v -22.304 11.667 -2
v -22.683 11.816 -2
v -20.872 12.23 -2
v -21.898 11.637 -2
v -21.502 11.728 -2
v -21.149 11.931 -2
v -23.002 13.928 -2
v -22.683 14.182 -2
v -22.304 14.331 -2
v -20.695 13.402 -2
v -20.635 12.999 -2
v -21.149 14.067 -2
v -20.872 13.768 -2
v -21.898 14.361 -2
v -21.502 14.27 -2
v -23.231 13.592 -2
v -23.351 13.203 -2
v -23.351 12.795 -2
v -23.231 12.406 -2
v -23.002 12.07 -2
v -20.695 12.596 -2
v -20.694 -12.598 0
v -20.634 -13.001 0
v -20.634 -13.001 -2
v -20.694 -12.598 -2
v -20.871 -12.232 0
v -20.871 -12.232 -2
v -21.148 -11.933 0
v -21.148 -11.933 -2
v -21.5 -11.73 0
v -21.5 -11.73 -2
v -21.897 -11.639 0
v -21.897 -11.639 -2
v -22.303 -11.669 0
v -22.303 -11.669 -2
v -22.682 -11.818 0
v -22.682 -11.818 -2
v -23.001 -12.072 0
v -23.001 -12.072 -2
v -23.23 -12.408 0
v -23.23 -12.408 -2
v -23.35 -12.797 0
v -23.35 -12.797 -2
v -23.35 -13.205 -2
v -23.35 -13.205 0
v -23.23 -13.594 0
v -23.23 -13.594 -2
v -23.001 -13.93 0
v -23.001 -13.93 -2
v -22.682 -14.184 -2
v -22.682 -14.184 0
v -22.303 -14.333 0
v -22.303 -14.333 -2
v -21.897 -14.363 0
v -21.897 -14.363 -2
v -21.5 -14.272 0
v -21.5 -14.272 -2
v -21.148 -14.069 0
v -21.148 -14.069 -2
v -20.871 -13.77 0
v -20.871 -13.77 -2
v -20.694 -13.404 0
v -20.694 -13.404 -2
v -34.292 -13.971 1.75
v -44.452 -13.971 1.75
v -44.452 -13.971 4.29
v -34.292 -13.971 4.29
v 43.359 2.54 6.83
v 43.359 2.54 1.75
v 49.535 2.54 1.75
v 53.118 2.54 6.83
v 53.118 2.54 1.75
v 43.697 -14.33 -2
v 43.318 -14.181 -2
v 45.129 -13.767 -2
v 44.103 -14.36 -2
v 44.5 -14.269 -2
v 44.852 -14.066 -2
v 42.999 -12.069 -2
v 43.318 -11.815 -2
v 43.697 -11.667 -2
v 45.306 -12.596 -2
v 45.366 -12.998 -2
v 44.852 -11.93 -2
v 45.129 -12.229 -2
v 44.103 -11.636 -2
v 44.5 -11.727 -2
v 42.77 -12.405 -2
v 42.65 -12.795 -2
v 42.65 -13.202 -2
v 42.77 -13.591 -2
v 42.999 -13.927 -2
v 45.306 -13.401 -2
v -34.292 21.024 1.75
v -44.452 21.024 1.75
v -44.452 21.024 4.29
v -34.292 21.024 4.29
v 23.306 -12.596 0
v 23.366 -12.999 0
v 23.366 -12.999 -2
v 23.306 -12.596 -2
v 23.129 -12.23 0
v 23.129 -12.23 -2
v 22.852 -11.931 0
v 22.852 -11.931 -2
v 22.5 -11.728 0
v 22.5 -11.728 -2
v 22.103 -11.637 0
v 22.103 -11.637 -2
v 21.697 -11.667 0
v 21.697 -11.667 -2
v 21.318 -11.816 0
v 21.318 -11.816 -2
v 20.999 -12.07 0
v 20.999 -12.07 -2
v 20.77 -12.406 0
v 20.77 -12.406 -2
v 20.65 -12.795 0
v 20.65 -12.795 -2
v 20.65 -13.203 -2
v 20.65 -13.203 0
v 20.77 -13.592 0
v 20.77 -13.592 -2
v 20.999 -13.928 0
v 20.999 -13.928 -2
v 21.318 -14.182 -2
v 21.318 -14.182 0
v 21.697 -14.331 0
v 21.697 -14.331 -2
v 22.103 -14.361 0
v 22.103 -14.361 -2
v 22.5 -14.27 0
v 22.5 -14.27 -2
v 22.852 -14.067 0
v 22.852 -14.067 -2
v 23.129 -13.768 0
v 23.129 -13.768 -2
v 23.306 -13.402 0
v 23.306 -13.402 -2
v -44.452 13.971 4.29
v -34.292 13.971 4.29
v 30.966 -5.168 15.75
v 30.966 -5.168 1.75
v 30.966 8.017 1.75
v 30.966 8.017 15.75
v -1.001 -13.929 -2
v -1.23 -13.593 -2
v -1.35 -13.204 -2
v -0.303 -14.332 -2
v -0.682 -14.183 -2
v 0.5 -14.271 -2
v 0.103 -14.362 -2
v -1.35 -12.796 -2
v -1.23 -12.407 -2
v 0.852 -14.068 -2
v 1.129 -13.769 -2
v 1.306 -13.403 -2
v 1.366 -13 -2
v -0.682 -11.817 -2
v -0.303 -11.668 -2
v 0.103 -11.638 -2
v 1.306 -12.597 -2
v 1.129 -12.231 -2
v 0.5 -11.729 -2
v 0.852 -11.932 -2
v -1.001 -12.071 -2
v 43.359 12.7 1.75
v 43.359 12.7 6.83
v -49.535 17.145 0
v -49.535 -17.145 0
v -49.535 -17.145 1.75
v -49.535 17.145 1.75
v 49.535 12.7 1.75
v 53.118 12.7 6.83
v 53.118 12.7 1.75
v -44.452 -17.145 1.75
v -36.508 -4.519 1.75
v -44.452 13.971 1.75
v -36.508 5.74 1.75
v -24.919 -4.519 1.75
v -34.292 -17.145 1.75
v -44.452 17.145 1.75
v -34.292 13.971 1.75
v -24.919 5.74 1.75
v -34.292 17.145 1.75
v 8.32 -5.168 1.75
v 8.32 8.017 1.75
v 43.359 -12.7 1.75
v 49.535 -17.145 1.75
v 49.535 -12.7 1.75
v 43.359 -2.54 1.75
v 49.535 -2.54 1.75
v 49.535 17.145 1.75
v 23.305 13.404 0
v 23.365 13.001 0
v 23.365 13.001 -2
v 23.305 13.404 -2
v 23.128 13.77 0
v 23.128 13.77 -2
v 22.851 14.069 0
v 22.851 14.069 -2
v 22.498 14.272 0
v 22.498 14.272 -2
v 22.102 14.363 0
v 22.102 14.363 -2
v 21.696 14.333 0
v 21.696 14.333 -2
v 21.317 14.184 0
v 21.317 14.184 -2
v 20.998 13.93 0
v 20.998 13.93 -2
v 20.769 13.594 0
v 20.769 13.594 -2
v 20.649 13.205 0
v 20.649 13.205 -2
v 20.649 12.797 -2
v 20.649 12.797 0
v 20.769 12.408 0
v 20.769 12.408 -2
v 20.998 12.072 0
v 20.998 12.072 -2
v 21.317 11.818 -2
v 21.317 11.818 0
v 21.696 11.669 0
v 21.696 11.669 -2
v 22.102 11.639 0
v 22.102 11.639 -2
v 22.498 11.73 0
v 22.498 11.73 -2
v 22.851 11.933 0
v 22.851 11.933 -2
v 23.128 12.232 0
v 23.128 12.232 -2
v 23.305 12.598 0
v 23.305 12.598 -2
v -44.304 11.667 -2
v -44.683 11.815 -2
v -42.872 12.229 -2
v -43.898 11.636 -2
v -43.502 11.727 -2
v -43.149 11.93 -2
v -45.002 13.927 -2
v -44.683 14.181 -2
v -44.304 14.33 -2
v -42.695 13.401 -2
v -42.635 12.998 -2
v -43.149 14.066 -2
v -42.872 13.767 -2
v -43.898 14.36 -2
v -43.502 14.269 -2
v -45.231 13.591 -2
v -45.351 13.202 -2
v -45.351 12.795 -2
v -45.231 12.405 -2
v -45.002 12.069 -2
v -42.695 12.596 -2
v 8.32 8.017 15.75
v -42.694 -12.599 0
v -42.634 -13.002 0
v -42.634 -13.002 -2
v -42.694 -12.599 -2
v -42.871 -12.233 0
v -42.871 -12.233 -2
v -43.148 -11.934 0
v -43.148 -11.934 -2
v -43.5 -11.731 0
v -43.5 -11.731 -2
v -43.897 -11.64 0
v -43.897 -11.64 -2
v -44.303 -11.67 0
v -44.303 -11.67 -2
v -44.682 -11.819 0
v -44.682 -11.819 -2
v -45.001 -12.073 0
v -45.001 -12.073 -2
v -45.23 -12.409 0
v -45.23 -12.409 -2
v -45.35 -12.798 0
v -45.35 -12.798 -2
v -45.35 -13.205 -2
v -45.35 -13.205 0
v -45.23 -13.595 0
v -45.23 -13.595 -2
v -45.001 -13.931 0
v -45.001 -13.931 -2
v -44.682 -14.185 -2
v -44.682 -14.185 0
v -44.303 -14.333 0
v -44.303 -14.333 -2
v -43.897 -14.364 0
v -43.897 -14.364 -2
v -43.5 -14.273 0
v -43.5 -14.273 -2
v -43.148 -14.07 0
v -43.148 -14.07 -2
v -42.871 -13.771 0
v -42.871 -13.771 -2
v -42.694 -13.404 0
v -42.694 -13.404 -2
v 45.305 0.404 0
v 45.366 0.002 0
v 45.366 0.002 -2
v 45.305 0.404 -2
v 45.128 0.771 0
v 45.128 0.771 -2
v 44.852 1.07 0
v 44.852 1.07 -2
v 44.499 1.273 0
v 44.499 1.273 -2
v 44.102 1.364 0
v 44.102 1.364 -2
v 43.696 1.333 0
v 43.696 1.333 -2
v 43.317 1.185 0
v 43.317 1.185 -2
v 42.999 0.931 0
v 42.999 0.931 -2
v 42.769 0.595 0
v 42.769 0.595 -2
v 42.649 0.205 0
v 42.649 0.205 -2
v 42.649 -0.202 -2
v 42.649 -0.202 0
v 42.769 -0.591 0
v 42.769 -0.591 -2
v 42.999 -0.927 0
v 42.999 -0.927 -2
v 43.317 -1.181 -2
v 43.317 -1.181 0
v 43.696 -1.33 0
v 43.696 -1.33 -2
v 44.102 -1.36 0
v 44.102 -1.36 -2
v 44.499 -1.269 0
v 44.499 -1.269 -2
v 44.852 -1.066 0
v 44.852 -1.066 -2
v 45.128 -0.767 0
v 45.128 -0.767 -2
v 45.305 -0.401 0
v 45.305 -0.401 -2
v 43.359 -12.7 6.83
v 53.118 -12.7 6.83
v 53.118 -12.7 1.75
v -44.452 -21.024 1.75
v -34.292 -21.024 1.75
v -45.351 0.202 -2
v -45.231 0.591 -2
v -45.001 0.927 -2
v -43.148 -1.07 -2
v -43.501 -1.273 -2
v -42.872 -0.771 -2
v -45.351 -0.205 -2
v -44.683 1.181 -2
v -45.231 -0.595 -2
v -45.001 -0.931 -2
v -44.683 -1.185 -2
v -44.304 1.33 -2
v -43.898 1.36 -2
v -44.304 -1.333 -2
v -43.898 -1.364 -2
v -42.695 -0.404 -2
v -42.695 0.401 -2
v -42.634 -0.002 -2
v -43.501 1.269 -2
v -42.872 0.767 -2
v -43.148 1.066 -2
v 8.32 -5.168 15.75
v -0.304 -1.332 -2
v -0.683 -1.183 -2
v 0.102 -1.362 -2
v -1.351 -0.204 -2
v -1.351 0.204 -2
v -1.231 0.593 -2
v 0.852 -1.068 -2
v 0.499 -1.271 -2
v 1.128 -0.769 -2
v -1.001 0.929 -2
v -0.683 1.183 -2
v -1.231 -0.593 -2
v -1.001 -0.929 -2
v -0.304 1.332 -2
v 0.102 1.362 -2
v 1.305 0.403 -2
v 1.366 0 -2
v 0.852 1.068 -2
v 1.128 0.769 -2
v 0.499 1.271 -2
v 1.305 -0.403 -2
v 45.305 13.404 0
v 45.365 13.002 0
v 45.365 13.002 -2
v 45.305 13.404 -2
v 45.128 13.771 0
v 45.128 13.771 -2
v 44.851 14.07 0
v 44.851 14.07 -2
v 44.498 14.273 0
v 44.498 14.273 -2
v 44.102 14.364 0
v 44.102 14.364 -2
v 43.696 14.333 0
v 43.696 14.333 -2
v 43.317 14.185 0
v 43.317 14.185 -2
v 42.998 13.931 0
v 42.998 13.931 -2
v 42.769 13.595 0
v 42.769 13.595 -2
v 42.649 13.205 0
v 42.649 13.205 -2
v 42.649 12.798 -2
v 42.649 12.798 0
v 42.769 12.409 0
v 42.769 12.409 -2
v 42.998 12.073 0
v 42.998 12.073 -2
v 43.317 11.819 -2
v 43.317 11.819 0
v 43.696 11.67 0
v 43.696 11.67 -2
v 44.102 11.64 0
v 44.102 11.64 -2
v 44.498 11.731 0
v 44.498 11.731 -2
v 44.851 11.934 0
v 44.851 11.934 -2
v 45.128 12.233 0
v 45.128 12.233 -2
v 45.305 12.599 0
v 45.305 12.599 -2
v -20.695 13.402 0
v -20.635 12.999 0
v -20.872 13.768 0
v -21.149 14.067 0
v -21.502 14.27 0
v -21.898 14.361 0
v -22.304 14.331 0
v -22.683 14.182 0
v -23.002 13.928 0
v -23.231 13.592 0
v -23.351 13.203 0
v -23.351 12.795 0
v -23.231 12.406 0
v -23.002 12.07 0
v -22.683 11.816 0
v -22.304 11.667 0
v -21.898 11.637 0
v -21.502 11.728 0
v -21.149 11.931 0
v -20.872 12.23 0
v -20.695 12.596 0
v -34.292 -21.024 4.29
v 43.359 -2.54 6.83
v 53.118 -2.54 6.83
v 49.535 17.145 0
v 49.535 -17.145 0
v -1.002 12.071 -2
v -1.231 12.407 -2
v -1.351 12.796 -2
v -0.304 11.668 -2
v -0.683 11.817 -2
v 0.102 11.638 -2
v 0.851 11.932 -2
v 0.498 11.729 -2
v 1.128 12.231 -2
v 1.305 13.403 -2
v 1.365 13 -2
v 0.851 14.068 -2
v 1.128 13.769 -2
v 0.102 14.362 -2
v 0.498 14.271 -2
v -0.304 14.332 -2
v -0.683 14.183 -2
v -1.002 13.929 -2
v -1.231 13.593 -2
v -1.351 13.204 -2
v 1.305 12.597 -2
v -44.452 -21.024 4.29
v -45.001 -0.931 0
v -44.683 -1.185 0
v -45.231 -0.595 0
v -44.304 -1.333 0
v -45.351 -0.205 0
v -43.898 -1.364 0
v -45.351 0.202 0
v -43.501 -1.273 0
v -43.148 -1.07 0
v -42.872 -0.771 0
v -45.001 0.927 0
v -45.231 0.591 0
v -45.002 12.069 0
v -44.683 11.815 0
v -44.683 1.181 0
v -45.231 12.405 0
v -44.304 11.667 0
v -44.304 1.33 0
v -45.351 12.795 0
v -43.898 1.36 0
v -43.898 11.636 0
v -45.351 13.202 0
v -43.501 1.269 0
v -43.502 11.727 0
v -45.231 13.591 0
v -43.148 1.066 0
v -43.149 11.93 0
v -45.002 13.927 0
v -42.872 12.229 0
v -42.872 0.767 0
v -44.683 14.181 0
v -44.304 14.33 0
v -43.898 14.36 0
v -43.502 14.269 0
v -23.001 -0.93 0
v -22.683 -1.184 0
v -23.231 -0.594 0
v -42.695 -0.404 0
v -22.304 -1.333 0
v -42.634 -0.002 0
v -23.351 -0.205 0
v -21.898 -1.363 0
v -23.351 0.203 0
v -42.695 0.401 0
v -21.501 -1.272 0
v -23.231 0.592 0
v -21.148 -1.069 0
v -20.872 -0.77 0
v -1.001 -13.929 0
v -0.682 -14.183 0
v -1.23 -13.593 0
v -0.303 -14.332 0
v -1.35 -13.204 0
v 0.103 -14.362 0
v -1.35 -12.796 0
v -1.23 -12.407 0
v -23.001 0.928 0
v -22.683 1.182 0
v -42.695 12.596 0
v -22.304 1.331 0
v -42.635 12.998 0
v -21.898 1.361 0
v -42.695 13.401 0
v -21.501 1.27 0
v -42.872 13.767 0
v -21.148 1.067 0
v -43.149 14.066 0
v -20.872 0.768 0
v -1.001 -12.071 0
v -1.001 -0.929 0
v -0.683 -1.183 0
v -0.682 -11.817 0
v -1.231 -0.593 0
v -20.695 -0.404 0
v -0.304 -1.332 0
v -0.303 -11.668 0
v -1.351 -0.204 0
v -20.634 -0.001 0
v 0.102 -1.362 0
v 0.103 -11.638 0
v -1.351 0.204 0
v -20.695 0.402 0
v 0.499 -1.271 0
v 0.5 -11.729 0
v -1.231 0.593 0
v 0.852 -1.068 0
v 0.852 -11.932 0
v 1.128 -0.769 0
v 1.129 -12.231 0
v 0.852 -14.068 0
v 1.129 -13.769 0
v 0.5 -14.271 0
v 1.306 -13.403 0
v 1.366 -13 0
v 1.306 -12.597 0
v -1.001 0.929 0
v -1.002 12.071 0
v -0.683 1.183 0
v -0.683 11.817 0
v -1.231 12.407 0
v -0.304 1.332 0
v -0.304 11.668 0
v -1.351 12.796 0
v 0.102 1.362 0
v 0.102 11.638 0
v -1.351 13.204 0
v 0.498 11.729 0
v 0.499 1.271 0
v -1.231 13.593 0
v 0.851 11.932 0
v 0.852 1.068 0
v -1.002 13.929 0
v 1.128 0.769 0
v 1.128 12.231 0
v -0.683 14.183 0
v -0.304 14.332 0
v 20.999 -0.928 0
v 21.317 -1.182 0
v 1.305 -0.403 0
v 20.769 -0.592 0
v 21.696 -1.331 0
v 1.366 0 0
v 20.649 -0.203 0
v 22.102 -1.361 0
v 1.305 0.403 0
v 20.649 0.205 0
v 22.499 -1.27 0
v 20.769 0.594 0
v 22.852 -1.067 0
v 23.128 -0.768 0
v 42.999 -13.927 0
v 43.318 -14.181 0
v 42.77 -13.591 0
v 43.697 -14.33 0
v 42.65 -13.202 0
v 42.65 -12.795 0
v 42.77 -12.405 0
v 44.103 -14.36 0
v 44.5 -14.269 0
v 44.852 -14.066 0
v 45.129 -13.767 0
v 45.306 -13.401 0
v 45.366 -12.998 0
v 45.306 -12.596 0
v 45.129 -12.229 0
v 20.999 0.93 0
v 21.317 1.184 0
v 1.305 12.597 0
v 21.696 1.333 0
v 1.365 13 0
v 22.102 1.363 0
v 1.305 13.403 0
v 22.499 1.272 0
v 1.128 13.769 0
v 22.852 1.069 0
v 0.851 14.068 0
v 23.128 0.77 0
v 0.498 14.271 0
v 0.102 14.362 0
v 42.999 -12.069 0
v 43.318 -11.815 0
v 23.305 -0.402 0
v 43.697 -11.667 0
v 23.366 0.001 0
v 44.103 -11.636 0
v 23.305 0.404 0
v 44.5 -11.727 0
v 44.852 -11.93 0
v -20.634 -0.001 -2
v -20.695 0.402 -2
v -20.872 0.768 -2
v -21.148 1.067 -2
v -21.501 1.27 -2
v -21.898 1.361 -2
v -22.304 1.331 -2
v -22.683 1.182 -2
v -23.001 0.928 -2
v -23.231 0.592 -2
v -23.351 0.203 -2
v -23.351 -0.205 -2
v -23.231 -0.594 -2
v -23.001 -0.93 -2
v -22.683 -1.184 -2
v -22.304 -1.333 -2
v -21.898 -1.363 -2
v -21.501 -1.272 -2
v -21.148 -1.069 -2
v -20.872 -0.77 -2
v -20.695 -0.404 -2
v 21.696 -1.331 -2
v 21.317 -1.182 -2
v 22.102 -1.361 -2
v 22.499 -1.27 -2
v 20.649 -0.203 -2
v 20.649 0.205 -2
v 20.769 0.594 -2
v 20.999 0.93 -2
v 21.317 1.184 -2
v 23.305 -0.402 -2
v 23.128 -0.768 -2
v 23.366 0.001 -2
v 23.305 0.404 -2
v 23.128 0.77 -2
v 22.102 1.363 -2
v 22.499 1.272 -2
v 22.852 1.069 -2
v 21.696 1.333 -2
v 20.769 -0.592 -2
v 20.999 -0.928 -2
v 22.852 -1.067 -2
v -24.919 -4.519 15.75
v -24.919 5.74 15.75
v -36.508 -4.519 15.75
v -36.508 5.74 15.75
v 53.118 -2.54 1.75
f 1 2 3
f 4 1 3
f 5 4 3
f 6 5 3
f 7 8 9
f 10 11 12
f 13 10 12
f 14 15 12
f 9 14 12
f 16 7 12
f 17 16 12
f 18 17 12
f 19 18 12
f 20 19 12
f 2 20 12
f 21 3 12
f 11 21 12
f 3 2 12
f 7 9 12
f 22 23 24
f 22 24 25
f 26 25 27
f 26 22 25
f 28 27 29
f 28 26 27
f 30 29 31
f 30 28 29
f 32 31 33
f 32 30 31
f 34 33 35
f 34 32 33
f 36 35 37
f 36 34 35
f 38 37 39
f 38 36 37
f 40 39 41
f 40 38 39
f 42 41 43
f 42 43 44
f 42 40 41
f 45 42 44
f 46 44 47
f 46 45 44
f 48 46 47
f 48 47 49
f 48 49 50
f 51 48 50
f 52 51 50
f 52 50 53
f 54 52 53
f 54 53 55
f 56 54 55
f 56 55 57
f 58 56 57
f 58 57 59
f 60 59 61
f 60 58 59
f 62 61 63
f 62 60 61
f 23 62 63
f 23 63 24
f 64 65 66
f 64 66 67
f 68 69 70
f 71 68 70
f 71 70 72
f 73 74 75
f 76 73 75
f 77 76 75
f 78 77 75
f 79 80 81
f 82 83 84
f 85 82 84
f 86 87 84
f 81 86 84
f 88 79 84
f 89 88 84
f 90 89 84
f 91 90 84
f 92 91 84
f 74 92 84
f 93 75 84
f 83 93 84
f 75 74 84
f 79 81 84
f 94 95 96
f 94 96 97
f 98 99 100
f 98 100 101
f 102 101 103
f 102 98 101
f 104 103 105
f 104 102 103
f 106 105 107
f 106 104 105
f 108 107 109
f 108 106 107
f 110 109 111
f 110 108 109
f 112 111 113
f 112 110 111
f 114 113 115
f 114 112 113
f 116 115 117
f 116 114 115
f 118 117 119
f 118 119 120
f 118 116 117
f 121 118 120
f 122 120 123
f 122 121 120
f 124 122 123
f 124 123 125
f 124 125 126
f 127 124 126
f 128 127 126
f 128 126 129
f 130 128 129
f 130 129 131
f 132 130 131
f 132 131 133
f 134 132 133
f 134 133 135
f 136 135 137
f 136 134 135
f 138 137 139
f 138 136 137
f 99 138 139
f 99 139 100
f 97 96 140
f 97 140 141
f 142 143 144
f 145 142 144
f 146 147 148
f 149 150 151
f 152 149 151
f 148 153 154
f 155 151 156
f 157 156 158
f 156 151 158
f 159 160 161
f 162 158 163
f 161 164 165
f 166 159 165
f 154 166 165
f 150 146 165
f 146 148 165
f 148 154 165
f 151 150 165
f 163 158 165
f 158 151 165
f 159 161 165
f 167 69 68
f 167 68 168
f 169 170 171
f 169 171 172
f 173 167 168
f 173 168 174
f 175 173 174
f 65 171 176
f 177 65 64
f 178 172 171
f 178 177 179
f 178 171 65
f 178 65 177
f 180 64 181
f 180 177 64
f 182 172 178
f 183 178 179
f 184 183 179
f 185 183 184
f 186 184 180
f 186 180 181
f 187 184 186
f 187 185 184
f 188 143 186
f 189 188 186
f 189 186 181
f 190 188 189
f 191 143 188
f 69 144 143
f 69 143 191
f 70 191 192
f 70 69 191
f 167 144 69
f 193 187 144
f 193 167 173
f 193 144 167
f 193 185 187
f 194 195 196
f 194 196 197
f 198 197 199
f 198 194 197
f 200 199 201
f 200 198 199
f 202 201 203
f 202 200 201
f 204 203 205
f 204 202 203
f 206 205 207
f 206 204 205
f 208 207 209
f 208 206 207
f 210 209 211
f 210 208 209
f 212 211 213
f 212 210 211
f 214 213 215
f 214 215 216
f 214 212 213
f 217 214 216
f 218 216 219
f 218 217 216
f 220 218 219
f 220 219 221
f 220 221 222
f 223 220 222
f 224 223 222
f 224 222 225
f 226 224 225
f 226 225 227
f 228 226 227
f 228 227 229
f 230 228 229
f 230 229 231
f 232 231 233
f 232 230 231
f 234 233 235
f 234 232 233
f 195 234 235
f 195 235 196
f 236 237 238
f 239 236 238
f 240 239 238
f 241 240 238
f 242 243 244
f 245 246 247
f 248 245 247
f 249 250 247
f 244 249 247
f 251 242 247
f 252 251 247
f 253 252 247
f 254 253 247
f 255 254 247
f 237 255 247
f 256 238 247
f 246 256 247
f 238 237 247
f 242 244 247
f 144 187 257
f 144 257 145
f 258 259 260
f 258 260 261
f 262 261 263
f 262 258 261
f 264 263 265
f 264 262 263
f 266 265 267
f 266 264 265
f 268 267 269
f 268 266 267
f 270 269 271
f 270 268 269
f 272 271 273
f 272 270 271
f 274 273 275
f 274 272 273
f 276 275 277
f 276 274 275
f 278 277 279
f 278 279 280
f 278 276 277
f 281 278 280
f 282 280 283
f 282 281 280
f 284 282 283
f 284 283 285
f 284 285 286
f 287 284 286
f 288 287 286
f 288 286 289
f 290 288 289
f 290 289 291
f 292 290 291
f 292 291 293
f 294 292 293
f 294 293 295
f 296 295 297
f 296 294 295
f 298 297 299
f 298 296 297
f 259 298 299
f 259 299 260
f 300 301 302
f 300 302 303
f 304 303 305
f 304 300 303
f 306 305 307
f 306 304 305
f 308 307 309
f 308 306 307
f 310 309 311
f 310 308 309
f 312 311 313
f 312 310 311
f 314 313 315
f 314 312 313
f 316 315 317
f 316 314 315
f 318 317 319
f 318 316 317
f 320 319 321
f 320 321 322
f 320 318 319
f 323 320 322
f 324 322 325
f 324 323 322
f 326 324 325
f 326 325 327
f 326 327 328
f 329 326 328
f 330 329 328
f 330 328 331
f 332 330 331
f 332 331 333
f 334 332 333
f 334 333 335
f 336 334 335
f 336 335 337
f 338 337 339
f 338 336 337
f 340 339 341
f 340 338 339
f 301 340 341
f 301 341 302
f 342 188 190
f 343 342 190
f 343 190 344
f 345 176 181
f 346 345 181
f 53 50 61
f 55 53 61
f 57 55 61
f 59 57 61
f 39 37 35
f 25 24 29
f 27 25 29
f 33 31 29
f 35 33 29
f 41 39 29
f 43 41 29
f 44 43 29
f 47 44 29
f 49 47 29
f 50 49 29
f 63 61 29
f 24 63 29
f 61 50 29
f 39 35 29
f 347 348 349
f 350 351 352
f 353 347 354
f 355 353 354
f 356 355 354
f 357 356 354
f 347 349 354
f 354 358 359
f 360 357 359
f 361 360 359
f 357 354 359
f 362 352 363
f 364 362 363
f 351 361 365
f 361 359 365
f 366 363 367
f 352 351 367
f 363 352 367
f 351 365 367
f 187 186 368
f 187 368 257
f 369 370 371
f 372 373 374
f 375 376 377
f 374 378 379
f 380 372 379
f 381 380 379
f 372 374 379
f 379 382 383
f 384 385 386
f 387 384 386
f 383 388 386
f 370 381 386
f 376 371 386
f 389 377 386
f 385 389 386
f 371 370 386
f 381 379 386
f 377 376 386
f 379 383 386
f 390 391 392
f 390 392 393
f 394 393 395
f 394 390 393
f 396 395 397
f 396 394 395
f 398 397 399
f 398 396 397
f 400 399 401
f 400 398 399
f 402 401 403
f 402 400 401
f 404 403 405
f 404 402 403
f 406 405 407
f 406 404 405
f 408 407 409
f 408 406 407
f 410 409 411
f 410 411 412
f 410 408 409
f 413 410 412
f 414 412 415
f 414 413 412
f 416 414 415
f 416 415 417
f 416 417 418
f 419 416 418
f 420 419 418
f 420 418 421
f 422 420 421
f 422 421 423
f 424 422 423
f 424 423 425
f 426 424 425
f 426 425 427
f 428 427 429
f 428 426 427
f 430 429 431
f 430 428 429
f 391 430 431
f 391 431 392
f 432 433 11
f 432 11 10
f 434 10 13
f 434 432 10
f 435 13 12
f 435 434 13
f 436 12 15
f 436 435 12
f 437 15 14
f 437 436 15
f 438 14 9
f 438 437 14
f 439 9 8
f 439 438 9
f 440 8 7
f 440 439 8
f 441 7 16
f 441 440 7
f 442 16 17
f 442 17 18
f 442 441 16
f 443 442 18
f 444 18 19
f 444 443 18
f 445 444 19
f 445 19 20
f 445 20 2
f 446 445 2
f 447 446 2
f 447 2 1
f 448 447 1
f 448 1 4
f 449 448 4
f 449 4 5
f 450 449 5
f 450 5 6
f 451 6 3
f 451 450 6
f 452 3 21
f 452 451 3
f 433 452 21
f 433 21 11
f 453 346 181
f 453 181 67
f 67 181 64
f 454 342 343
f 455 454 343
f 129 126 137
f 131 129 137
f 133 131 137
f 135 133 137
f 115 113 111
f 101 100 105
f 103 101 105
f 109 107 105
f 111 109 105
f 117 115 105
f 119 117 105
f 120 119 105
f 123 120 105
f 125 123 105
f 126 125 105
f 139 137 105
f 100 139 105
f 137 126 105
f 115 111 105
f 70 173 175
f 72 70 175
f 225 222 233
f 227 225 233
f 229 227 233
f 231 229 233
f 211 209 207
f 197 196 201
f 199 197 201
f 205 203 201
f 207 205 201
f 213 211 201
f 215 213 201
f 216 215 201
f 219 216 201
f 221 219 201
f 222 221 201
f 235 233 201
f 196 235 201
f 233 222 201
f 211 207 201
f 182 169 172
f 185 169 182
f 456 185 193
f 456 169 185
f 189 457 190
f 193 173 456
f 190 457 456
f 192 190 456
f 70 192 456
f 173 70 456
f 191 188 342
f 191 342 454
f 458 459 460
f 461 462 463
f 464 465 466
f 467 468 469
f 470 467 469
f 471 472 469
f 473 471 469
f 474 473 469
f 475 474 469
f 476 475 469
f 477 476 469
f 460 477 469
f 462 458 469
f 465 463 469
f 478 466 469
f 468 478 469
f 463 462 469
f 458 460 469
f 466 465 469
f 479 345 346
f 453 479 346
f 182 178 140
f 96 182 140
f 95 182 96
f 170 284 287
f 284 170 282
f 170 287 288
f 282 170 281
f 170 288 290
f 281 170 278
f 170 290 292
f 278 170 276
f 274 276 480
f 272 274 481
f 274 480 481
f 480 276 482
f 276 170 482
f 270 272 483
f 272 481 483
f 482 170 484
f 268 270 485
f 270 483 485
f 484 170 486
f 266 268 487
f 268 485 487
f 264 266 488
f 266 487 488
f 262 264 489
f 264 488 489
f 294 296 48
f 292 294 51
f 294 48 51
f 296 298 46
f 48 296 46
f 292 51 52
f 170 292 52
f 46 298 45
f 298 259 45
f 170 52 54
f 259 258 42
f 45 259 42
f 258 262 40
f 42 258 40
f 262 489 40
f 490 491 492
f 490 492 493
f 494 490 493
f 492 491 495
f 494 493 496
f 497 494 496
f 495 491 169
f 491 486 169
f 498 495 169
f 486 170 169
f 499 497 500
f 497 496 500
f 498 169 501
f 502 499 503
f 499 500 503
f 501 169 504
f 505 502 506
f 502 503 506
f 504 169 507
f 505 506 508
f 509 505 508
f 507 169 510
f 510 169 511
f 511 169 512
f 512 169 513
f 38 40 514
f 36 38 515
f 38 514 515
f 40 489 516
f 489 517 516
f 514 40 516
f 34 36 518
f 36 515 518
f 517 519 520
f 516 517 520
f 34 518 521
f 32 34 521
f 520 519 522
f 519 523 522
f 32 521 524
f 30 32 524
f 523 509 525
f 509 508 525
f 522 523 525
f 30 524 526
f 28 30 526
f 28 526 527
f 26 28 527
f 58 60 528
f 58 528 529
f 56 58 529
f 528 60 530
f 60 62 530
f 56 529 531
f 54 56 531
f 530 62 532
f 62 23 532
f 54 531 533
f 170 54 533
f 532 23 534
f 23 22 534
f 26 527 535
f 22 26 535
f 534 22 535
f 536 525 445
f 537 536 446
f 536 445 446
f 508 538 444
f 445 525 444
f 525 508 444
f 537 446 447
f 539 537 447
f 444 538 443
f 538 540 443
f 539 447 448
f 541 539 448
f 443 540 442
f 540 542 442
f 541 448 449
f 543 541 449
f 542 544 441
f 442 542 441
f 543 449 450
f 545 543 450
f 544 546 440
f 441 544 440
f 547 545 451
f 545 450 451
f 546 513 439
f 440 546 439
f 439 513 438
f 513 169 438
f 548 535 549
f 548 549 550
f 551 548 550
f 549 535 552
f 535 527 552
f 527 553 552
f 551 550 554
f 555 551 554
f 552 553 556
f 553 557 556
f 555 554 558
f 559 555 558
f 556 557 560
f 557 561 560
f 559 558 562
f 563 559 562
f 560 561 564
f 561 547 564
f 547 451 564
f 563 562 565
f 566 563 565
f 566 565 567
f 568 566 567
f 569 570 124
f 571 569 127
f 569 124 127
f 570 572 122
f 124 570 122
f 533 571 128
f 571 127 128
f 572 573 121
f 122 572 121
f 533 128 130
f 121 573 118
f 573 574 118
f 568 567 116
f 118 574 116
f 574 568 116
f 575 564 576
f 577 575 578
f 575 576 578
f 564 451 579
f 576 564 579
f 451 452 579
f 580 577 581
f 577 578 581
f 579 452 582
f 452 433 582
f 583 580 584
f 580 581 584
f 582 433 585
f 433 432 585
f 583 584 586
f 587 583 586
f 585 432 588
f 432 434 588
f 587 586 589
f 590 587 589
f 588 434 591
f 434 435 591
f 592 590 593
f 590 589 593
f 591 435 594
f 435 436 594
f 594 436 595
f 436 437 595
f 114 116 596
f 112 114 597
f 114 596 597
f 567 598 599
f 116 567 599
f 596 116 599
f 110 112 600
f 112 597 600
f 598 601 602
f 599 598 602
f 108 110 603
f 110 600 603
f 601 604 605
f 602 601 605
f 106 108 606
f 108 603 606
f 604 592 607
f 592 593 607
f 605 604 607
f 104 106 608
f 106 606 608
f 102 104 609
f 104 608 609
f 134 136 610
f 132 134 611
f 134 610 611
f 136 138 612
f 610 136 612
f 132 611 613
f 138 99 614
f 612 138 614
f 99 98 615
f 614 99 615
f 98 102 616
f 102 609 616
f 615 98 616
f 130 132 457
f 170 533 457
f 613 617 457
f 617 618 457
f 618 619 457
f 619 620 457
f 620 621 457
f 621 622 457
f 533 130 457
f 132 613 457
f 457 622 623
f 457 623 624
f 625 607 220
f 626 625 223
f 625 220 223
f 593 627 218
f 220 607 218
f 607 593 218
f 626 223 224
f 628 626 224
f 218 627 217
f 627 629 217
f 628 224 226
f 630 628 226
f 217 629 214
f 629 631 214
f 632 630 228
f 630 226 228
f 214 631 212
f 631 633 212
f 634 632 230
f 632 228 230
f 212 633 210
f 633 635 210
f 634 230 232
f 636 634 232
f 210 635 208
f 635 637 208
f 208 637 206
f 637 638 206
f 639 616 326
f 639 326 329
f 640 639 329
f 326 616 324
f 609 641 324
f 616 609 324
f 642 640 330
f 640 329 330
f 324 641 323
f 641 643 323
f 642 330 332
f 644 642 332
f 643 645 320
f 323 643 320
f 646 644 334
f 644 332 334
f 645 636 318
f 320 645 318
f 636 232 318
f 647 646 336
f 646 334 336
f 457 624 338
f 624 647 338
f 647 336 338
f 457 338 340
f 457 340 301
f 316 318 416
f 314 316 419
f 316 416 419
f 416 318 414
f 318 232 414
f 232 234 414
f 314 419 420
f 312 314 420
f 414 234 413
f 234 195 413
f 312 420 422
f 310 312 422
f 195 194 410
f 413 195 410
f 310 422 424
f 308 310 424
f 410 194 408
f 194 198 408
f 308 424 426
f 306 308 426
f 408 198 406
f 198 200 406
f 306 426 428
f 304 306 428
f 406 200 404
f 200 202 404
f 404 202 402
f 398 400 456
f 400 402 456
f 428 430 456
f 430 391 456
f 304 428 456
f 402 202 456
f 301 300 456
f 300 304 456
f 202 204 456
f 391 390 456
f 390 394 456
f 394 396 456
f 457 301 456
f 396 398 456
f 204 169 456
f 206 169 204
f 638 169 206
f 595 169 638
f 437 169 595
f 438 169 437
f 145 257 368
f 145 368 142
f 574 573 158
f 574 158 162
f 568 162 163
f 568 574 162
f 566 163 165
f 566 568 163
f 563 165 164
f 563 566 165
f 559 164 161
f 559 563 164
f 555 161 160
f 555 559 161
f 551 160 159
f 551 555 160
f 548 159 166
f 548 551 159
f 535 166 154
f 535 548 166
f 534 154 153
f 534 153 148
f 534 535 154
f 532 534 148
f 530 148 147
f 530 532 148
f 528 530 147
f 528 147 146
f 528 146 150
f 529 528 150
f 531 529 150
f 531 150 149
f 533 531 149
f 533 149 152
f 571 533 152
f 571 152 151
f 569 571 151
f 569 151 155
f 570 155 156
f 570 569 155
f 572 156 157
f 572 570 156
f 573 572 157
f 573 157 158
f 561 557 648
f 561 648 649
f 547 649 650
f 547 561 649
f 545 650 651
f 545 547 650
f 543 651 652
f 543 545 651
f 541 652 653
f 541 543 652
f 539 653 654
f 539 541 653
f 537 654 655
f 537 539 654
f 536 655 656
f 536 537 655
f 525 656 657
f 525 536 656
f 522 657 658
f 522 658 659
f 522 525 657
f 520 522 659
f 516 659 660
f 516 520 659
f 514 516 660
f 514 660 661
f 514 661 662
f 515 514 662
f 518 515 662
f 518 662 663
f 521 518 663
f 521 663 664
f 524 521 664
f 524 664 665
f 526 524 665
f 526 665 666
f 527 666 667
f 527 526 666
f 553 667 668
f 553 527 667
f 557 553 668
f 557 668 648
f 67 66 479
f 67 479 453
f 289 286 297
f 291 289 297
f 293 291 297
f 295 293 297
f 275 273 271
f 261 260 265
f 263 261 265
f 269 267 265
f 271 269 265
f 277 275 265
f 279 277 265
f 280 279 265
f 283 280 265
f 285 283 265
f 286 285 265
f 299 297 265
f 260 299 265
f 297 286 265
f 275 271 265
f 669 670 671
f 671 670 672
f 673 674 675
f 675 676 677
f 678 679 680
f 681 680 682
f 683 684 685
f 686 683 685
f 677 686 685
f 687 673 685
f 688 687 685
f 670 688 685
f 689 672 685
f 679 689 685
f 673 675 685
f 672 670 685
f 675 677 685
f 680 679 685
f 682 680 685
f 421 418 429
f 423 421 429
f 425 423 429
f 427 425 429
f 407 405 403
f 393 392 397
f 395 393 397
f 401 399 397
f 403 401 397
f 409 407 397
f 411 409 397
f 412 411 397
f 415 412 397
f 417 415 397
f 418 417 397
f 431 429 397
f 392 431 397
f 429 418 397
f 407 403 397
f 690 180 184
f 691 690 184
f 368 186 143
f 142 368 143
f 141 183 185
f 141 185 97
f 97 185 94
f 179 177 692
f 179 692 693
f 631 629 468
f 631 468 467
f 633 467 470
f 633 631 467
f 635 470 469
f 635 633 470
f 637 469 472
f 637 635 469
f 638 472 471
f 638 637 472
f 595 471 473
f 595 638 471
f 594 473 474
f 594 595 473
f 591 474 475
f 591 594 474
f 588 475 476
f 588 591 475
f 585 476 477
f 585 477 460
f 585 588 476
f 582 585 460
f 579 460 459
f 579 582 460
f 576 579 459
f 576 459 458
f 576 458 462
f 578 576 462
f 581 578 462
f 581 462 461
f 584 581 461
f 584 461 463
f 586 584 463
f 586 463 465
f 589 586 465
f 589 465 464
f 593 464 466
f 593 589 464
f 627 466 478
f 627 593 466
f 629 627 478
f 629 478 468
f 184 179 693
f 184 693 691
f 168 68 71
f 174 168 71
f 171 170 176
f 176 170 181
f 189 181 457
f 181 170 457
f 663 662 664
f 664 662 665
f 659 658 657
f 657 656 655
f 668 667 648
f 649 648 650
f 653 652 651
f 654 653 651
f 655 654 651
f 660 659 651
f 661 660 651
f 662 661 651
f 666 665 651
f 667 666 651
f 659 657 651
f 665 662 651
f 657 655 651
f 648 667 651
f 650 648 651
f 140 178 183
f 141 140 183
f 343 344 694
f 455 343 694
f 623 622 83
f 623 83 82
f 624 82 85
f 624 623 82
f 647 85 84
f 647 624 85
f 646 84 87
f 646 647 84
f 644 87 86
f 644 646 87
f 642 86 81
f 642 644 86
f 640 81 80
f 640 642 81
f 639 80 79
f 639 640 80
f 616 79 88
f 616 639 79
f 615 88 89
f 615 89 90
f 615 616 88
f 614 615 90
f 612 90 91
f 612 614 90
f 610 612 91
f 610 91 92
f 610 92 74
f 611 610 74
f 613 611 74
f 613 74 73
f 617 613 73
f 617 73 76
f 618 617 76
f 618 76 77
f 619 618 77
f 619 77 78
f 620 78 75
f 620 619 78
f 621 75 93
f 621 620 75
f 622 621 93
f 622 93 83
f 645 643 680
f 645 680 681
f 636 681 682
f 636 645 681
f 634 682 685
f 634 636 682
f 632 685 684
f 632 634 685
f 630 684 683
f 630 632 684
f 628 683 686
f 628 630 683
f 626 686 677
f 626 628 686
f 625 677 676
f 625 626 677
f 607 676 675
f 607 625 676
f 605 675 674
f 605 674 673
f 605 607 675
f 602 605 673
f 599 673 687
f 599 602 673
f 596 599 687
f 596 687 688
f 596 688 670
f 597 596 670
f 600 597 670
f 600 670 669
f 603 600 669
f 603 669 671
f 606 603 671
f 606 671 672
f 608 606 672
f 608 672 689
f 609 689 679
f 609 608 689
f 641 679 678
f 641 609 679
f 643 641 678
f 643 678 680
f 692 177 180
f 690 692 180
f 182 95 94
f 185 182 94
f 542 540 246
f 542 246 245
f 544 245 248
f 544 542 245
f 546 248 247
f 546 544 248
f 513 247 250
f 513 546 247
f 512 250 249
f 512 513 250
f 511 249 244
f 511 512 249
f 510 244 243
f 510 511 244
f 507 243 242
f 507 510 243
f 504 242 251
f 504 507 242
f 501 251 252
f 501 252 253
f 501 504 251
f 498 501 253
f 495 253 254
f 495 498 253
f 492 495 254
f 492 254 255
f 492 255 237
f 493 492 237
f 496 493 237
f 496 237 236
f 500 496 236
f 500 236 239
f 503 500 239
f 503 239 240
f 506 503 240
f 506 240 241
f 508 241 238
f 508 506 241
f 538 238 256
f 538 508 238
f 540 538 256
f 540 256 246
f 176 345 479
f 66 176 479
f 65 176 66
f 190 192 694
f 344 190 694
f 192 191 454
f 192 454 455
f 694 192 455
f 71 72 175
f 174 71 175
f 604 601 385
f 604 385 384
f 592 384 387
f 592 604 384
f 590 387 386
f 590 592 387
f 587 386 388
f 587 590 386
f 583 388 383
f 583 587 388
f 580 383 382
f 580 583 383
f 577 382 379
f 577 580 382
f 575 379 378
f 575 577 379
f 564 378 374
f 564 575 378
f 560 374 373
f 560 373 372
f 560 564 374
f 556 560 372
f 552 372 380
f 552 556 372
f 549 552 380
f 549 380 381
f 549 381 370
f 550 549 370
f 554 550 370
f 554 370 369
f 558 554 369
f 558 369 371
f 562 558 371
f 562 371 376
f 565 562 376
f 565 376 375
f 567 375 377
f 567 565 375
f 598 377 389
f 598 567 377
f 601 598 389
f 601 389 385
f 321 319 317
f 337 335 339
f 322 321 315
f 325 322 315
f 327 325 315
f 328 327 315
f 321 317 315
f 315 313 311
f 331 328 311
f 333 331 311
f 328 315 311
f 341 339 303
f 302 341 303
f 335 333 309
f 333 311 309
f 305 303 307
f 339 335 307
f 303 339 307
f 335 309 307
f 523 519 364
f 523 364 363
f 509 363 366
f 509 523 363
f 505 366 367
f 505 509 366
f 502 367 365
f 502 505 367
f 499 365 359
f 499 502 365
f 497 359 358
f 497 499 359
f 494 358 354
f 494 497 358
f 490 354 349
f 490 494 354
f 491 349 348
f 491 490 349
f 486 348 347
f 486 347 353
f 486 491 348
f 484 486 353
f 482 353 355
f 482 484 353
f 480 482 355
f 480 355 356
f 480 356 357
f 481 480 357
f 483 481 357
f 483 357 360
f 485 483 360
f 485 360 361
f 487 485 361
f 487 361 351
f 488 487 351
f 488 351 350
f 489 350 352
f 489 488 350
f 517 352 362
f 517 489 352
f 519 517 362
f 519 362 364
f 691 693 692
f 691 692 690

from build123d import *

# Parameters (mm, degrees)
SKETCH_W      = 99.07
SKETCH_H      = 34.29
PAD_DEPTH     = 1.75
SKETCH001_R   = 1.365796
PAD001_DEPTH  = 2
SKETCH013_W   = 11.589402
SKETCH013_H   = 10.258059
SKETCH013_W_2 = 22.646941
SKETCH013_H_2 = 13.185007
PAD010_DEPTH  = 14
SKETCH016_W   = 9.758744
SKETCH016_H   = 10.16
PAD013_DEPTH  = 5.08
SKETCH017_W   = 10.16
SKETCH017_H   = 7.052728
PAD014_DEPTH  = 2.54


with BuildPart() as part:
    # Sketch → Pad (new body)
    with BuildSketch(Plane.XY):
        Rectangle(SKETCH_W, SKETCH_H)
    extrude(amount=PAD_DEPTH)

    # Sketch001 → Pad001 (join)
    with BuildSketch(Plane.XY):
        with Locations((-44.000565, 12.998089)):
            Circle(SKETCH001_R)
        with Locations((-22.000565, 12.999044)):
            Circle(SKETCH001_R)
        with Locations((-0.000565, 13)):
            Circle(SKETCH001_R)
        with Locations((21.999435, 13.000956)):
            Circle(SKETCH001_R)
        with Locations((43.999435, 13.001911)):
            Circle(SKETCH001_R)
        with Locations((-44, -0.001911)):
            Circle(SKETCH001_R)
        with Locations((-22, -0.000956)):
            Circle(SKETCH001_R)
        Circle(SKETCH001_R)
        with Locations((22, 0.000956)):
            Circle(SKETCH001_R)
        with Locations((44, 0.001911)):
            Circle(SKETCH001_R)
        with Locations((-43.999435, -13.001911)):
            Circle(SKETCH001_R)
        with Locations((-21.999435, -13.000956)):
            Circle(SKETCH001_R)
        with Locations((0.000565, -13)):
            Circle(SKETCH001_R)
        with Locations((22.000565, -12.999044)):
            Circle(SKETCH001_R)
        with Locations((44.000565, -12.998089)):
            Circle(SKETCH001_R)
    extrude(amount=-PAD001_DEPTH)

    # Sketch013 → Pad010 (join)
    with BuildSketch(Plane.XY.offset(1.75)):
        with Locations((-30.713279, 0.610479)):
            Rectangle(SKETCH013_W, SKETCH013_H)
        with Locations((19.642979, 1.424736)):
            Rectangle(SKETCH013_W_2, SKETCH013_H_2)
    extrude(amount=PAD010_DEPTH)

    # Sketch016 → Pad013 (join)
    with BuildSketch(Plane.XY.offset(1.75)):
        with Locations((48.238372, 7.62)):
            Rectangle(SKETCH016_W, SKETCH016_H)
        with Locations((48.238372, -7.62)):
            Rectangle(SKETCH016_W, SKETCH016_H)
    extrude(amount=PAD013_DEPTH)

    # Sketch017 → Pad014 (join)
    with BuildSketch(Plane.XY.offset(1.75)):
        with Locations((-39.372, 17.497364)):
            Rectangle(SKETCH017_W, SKETCH017_H)
        with Locations((-39.372, -17.497364)):
            Rectangle(SKETCH017_W, SKETCH017_H)
    extrude(amount=PAD014_DEPTH)


solid = part.part
